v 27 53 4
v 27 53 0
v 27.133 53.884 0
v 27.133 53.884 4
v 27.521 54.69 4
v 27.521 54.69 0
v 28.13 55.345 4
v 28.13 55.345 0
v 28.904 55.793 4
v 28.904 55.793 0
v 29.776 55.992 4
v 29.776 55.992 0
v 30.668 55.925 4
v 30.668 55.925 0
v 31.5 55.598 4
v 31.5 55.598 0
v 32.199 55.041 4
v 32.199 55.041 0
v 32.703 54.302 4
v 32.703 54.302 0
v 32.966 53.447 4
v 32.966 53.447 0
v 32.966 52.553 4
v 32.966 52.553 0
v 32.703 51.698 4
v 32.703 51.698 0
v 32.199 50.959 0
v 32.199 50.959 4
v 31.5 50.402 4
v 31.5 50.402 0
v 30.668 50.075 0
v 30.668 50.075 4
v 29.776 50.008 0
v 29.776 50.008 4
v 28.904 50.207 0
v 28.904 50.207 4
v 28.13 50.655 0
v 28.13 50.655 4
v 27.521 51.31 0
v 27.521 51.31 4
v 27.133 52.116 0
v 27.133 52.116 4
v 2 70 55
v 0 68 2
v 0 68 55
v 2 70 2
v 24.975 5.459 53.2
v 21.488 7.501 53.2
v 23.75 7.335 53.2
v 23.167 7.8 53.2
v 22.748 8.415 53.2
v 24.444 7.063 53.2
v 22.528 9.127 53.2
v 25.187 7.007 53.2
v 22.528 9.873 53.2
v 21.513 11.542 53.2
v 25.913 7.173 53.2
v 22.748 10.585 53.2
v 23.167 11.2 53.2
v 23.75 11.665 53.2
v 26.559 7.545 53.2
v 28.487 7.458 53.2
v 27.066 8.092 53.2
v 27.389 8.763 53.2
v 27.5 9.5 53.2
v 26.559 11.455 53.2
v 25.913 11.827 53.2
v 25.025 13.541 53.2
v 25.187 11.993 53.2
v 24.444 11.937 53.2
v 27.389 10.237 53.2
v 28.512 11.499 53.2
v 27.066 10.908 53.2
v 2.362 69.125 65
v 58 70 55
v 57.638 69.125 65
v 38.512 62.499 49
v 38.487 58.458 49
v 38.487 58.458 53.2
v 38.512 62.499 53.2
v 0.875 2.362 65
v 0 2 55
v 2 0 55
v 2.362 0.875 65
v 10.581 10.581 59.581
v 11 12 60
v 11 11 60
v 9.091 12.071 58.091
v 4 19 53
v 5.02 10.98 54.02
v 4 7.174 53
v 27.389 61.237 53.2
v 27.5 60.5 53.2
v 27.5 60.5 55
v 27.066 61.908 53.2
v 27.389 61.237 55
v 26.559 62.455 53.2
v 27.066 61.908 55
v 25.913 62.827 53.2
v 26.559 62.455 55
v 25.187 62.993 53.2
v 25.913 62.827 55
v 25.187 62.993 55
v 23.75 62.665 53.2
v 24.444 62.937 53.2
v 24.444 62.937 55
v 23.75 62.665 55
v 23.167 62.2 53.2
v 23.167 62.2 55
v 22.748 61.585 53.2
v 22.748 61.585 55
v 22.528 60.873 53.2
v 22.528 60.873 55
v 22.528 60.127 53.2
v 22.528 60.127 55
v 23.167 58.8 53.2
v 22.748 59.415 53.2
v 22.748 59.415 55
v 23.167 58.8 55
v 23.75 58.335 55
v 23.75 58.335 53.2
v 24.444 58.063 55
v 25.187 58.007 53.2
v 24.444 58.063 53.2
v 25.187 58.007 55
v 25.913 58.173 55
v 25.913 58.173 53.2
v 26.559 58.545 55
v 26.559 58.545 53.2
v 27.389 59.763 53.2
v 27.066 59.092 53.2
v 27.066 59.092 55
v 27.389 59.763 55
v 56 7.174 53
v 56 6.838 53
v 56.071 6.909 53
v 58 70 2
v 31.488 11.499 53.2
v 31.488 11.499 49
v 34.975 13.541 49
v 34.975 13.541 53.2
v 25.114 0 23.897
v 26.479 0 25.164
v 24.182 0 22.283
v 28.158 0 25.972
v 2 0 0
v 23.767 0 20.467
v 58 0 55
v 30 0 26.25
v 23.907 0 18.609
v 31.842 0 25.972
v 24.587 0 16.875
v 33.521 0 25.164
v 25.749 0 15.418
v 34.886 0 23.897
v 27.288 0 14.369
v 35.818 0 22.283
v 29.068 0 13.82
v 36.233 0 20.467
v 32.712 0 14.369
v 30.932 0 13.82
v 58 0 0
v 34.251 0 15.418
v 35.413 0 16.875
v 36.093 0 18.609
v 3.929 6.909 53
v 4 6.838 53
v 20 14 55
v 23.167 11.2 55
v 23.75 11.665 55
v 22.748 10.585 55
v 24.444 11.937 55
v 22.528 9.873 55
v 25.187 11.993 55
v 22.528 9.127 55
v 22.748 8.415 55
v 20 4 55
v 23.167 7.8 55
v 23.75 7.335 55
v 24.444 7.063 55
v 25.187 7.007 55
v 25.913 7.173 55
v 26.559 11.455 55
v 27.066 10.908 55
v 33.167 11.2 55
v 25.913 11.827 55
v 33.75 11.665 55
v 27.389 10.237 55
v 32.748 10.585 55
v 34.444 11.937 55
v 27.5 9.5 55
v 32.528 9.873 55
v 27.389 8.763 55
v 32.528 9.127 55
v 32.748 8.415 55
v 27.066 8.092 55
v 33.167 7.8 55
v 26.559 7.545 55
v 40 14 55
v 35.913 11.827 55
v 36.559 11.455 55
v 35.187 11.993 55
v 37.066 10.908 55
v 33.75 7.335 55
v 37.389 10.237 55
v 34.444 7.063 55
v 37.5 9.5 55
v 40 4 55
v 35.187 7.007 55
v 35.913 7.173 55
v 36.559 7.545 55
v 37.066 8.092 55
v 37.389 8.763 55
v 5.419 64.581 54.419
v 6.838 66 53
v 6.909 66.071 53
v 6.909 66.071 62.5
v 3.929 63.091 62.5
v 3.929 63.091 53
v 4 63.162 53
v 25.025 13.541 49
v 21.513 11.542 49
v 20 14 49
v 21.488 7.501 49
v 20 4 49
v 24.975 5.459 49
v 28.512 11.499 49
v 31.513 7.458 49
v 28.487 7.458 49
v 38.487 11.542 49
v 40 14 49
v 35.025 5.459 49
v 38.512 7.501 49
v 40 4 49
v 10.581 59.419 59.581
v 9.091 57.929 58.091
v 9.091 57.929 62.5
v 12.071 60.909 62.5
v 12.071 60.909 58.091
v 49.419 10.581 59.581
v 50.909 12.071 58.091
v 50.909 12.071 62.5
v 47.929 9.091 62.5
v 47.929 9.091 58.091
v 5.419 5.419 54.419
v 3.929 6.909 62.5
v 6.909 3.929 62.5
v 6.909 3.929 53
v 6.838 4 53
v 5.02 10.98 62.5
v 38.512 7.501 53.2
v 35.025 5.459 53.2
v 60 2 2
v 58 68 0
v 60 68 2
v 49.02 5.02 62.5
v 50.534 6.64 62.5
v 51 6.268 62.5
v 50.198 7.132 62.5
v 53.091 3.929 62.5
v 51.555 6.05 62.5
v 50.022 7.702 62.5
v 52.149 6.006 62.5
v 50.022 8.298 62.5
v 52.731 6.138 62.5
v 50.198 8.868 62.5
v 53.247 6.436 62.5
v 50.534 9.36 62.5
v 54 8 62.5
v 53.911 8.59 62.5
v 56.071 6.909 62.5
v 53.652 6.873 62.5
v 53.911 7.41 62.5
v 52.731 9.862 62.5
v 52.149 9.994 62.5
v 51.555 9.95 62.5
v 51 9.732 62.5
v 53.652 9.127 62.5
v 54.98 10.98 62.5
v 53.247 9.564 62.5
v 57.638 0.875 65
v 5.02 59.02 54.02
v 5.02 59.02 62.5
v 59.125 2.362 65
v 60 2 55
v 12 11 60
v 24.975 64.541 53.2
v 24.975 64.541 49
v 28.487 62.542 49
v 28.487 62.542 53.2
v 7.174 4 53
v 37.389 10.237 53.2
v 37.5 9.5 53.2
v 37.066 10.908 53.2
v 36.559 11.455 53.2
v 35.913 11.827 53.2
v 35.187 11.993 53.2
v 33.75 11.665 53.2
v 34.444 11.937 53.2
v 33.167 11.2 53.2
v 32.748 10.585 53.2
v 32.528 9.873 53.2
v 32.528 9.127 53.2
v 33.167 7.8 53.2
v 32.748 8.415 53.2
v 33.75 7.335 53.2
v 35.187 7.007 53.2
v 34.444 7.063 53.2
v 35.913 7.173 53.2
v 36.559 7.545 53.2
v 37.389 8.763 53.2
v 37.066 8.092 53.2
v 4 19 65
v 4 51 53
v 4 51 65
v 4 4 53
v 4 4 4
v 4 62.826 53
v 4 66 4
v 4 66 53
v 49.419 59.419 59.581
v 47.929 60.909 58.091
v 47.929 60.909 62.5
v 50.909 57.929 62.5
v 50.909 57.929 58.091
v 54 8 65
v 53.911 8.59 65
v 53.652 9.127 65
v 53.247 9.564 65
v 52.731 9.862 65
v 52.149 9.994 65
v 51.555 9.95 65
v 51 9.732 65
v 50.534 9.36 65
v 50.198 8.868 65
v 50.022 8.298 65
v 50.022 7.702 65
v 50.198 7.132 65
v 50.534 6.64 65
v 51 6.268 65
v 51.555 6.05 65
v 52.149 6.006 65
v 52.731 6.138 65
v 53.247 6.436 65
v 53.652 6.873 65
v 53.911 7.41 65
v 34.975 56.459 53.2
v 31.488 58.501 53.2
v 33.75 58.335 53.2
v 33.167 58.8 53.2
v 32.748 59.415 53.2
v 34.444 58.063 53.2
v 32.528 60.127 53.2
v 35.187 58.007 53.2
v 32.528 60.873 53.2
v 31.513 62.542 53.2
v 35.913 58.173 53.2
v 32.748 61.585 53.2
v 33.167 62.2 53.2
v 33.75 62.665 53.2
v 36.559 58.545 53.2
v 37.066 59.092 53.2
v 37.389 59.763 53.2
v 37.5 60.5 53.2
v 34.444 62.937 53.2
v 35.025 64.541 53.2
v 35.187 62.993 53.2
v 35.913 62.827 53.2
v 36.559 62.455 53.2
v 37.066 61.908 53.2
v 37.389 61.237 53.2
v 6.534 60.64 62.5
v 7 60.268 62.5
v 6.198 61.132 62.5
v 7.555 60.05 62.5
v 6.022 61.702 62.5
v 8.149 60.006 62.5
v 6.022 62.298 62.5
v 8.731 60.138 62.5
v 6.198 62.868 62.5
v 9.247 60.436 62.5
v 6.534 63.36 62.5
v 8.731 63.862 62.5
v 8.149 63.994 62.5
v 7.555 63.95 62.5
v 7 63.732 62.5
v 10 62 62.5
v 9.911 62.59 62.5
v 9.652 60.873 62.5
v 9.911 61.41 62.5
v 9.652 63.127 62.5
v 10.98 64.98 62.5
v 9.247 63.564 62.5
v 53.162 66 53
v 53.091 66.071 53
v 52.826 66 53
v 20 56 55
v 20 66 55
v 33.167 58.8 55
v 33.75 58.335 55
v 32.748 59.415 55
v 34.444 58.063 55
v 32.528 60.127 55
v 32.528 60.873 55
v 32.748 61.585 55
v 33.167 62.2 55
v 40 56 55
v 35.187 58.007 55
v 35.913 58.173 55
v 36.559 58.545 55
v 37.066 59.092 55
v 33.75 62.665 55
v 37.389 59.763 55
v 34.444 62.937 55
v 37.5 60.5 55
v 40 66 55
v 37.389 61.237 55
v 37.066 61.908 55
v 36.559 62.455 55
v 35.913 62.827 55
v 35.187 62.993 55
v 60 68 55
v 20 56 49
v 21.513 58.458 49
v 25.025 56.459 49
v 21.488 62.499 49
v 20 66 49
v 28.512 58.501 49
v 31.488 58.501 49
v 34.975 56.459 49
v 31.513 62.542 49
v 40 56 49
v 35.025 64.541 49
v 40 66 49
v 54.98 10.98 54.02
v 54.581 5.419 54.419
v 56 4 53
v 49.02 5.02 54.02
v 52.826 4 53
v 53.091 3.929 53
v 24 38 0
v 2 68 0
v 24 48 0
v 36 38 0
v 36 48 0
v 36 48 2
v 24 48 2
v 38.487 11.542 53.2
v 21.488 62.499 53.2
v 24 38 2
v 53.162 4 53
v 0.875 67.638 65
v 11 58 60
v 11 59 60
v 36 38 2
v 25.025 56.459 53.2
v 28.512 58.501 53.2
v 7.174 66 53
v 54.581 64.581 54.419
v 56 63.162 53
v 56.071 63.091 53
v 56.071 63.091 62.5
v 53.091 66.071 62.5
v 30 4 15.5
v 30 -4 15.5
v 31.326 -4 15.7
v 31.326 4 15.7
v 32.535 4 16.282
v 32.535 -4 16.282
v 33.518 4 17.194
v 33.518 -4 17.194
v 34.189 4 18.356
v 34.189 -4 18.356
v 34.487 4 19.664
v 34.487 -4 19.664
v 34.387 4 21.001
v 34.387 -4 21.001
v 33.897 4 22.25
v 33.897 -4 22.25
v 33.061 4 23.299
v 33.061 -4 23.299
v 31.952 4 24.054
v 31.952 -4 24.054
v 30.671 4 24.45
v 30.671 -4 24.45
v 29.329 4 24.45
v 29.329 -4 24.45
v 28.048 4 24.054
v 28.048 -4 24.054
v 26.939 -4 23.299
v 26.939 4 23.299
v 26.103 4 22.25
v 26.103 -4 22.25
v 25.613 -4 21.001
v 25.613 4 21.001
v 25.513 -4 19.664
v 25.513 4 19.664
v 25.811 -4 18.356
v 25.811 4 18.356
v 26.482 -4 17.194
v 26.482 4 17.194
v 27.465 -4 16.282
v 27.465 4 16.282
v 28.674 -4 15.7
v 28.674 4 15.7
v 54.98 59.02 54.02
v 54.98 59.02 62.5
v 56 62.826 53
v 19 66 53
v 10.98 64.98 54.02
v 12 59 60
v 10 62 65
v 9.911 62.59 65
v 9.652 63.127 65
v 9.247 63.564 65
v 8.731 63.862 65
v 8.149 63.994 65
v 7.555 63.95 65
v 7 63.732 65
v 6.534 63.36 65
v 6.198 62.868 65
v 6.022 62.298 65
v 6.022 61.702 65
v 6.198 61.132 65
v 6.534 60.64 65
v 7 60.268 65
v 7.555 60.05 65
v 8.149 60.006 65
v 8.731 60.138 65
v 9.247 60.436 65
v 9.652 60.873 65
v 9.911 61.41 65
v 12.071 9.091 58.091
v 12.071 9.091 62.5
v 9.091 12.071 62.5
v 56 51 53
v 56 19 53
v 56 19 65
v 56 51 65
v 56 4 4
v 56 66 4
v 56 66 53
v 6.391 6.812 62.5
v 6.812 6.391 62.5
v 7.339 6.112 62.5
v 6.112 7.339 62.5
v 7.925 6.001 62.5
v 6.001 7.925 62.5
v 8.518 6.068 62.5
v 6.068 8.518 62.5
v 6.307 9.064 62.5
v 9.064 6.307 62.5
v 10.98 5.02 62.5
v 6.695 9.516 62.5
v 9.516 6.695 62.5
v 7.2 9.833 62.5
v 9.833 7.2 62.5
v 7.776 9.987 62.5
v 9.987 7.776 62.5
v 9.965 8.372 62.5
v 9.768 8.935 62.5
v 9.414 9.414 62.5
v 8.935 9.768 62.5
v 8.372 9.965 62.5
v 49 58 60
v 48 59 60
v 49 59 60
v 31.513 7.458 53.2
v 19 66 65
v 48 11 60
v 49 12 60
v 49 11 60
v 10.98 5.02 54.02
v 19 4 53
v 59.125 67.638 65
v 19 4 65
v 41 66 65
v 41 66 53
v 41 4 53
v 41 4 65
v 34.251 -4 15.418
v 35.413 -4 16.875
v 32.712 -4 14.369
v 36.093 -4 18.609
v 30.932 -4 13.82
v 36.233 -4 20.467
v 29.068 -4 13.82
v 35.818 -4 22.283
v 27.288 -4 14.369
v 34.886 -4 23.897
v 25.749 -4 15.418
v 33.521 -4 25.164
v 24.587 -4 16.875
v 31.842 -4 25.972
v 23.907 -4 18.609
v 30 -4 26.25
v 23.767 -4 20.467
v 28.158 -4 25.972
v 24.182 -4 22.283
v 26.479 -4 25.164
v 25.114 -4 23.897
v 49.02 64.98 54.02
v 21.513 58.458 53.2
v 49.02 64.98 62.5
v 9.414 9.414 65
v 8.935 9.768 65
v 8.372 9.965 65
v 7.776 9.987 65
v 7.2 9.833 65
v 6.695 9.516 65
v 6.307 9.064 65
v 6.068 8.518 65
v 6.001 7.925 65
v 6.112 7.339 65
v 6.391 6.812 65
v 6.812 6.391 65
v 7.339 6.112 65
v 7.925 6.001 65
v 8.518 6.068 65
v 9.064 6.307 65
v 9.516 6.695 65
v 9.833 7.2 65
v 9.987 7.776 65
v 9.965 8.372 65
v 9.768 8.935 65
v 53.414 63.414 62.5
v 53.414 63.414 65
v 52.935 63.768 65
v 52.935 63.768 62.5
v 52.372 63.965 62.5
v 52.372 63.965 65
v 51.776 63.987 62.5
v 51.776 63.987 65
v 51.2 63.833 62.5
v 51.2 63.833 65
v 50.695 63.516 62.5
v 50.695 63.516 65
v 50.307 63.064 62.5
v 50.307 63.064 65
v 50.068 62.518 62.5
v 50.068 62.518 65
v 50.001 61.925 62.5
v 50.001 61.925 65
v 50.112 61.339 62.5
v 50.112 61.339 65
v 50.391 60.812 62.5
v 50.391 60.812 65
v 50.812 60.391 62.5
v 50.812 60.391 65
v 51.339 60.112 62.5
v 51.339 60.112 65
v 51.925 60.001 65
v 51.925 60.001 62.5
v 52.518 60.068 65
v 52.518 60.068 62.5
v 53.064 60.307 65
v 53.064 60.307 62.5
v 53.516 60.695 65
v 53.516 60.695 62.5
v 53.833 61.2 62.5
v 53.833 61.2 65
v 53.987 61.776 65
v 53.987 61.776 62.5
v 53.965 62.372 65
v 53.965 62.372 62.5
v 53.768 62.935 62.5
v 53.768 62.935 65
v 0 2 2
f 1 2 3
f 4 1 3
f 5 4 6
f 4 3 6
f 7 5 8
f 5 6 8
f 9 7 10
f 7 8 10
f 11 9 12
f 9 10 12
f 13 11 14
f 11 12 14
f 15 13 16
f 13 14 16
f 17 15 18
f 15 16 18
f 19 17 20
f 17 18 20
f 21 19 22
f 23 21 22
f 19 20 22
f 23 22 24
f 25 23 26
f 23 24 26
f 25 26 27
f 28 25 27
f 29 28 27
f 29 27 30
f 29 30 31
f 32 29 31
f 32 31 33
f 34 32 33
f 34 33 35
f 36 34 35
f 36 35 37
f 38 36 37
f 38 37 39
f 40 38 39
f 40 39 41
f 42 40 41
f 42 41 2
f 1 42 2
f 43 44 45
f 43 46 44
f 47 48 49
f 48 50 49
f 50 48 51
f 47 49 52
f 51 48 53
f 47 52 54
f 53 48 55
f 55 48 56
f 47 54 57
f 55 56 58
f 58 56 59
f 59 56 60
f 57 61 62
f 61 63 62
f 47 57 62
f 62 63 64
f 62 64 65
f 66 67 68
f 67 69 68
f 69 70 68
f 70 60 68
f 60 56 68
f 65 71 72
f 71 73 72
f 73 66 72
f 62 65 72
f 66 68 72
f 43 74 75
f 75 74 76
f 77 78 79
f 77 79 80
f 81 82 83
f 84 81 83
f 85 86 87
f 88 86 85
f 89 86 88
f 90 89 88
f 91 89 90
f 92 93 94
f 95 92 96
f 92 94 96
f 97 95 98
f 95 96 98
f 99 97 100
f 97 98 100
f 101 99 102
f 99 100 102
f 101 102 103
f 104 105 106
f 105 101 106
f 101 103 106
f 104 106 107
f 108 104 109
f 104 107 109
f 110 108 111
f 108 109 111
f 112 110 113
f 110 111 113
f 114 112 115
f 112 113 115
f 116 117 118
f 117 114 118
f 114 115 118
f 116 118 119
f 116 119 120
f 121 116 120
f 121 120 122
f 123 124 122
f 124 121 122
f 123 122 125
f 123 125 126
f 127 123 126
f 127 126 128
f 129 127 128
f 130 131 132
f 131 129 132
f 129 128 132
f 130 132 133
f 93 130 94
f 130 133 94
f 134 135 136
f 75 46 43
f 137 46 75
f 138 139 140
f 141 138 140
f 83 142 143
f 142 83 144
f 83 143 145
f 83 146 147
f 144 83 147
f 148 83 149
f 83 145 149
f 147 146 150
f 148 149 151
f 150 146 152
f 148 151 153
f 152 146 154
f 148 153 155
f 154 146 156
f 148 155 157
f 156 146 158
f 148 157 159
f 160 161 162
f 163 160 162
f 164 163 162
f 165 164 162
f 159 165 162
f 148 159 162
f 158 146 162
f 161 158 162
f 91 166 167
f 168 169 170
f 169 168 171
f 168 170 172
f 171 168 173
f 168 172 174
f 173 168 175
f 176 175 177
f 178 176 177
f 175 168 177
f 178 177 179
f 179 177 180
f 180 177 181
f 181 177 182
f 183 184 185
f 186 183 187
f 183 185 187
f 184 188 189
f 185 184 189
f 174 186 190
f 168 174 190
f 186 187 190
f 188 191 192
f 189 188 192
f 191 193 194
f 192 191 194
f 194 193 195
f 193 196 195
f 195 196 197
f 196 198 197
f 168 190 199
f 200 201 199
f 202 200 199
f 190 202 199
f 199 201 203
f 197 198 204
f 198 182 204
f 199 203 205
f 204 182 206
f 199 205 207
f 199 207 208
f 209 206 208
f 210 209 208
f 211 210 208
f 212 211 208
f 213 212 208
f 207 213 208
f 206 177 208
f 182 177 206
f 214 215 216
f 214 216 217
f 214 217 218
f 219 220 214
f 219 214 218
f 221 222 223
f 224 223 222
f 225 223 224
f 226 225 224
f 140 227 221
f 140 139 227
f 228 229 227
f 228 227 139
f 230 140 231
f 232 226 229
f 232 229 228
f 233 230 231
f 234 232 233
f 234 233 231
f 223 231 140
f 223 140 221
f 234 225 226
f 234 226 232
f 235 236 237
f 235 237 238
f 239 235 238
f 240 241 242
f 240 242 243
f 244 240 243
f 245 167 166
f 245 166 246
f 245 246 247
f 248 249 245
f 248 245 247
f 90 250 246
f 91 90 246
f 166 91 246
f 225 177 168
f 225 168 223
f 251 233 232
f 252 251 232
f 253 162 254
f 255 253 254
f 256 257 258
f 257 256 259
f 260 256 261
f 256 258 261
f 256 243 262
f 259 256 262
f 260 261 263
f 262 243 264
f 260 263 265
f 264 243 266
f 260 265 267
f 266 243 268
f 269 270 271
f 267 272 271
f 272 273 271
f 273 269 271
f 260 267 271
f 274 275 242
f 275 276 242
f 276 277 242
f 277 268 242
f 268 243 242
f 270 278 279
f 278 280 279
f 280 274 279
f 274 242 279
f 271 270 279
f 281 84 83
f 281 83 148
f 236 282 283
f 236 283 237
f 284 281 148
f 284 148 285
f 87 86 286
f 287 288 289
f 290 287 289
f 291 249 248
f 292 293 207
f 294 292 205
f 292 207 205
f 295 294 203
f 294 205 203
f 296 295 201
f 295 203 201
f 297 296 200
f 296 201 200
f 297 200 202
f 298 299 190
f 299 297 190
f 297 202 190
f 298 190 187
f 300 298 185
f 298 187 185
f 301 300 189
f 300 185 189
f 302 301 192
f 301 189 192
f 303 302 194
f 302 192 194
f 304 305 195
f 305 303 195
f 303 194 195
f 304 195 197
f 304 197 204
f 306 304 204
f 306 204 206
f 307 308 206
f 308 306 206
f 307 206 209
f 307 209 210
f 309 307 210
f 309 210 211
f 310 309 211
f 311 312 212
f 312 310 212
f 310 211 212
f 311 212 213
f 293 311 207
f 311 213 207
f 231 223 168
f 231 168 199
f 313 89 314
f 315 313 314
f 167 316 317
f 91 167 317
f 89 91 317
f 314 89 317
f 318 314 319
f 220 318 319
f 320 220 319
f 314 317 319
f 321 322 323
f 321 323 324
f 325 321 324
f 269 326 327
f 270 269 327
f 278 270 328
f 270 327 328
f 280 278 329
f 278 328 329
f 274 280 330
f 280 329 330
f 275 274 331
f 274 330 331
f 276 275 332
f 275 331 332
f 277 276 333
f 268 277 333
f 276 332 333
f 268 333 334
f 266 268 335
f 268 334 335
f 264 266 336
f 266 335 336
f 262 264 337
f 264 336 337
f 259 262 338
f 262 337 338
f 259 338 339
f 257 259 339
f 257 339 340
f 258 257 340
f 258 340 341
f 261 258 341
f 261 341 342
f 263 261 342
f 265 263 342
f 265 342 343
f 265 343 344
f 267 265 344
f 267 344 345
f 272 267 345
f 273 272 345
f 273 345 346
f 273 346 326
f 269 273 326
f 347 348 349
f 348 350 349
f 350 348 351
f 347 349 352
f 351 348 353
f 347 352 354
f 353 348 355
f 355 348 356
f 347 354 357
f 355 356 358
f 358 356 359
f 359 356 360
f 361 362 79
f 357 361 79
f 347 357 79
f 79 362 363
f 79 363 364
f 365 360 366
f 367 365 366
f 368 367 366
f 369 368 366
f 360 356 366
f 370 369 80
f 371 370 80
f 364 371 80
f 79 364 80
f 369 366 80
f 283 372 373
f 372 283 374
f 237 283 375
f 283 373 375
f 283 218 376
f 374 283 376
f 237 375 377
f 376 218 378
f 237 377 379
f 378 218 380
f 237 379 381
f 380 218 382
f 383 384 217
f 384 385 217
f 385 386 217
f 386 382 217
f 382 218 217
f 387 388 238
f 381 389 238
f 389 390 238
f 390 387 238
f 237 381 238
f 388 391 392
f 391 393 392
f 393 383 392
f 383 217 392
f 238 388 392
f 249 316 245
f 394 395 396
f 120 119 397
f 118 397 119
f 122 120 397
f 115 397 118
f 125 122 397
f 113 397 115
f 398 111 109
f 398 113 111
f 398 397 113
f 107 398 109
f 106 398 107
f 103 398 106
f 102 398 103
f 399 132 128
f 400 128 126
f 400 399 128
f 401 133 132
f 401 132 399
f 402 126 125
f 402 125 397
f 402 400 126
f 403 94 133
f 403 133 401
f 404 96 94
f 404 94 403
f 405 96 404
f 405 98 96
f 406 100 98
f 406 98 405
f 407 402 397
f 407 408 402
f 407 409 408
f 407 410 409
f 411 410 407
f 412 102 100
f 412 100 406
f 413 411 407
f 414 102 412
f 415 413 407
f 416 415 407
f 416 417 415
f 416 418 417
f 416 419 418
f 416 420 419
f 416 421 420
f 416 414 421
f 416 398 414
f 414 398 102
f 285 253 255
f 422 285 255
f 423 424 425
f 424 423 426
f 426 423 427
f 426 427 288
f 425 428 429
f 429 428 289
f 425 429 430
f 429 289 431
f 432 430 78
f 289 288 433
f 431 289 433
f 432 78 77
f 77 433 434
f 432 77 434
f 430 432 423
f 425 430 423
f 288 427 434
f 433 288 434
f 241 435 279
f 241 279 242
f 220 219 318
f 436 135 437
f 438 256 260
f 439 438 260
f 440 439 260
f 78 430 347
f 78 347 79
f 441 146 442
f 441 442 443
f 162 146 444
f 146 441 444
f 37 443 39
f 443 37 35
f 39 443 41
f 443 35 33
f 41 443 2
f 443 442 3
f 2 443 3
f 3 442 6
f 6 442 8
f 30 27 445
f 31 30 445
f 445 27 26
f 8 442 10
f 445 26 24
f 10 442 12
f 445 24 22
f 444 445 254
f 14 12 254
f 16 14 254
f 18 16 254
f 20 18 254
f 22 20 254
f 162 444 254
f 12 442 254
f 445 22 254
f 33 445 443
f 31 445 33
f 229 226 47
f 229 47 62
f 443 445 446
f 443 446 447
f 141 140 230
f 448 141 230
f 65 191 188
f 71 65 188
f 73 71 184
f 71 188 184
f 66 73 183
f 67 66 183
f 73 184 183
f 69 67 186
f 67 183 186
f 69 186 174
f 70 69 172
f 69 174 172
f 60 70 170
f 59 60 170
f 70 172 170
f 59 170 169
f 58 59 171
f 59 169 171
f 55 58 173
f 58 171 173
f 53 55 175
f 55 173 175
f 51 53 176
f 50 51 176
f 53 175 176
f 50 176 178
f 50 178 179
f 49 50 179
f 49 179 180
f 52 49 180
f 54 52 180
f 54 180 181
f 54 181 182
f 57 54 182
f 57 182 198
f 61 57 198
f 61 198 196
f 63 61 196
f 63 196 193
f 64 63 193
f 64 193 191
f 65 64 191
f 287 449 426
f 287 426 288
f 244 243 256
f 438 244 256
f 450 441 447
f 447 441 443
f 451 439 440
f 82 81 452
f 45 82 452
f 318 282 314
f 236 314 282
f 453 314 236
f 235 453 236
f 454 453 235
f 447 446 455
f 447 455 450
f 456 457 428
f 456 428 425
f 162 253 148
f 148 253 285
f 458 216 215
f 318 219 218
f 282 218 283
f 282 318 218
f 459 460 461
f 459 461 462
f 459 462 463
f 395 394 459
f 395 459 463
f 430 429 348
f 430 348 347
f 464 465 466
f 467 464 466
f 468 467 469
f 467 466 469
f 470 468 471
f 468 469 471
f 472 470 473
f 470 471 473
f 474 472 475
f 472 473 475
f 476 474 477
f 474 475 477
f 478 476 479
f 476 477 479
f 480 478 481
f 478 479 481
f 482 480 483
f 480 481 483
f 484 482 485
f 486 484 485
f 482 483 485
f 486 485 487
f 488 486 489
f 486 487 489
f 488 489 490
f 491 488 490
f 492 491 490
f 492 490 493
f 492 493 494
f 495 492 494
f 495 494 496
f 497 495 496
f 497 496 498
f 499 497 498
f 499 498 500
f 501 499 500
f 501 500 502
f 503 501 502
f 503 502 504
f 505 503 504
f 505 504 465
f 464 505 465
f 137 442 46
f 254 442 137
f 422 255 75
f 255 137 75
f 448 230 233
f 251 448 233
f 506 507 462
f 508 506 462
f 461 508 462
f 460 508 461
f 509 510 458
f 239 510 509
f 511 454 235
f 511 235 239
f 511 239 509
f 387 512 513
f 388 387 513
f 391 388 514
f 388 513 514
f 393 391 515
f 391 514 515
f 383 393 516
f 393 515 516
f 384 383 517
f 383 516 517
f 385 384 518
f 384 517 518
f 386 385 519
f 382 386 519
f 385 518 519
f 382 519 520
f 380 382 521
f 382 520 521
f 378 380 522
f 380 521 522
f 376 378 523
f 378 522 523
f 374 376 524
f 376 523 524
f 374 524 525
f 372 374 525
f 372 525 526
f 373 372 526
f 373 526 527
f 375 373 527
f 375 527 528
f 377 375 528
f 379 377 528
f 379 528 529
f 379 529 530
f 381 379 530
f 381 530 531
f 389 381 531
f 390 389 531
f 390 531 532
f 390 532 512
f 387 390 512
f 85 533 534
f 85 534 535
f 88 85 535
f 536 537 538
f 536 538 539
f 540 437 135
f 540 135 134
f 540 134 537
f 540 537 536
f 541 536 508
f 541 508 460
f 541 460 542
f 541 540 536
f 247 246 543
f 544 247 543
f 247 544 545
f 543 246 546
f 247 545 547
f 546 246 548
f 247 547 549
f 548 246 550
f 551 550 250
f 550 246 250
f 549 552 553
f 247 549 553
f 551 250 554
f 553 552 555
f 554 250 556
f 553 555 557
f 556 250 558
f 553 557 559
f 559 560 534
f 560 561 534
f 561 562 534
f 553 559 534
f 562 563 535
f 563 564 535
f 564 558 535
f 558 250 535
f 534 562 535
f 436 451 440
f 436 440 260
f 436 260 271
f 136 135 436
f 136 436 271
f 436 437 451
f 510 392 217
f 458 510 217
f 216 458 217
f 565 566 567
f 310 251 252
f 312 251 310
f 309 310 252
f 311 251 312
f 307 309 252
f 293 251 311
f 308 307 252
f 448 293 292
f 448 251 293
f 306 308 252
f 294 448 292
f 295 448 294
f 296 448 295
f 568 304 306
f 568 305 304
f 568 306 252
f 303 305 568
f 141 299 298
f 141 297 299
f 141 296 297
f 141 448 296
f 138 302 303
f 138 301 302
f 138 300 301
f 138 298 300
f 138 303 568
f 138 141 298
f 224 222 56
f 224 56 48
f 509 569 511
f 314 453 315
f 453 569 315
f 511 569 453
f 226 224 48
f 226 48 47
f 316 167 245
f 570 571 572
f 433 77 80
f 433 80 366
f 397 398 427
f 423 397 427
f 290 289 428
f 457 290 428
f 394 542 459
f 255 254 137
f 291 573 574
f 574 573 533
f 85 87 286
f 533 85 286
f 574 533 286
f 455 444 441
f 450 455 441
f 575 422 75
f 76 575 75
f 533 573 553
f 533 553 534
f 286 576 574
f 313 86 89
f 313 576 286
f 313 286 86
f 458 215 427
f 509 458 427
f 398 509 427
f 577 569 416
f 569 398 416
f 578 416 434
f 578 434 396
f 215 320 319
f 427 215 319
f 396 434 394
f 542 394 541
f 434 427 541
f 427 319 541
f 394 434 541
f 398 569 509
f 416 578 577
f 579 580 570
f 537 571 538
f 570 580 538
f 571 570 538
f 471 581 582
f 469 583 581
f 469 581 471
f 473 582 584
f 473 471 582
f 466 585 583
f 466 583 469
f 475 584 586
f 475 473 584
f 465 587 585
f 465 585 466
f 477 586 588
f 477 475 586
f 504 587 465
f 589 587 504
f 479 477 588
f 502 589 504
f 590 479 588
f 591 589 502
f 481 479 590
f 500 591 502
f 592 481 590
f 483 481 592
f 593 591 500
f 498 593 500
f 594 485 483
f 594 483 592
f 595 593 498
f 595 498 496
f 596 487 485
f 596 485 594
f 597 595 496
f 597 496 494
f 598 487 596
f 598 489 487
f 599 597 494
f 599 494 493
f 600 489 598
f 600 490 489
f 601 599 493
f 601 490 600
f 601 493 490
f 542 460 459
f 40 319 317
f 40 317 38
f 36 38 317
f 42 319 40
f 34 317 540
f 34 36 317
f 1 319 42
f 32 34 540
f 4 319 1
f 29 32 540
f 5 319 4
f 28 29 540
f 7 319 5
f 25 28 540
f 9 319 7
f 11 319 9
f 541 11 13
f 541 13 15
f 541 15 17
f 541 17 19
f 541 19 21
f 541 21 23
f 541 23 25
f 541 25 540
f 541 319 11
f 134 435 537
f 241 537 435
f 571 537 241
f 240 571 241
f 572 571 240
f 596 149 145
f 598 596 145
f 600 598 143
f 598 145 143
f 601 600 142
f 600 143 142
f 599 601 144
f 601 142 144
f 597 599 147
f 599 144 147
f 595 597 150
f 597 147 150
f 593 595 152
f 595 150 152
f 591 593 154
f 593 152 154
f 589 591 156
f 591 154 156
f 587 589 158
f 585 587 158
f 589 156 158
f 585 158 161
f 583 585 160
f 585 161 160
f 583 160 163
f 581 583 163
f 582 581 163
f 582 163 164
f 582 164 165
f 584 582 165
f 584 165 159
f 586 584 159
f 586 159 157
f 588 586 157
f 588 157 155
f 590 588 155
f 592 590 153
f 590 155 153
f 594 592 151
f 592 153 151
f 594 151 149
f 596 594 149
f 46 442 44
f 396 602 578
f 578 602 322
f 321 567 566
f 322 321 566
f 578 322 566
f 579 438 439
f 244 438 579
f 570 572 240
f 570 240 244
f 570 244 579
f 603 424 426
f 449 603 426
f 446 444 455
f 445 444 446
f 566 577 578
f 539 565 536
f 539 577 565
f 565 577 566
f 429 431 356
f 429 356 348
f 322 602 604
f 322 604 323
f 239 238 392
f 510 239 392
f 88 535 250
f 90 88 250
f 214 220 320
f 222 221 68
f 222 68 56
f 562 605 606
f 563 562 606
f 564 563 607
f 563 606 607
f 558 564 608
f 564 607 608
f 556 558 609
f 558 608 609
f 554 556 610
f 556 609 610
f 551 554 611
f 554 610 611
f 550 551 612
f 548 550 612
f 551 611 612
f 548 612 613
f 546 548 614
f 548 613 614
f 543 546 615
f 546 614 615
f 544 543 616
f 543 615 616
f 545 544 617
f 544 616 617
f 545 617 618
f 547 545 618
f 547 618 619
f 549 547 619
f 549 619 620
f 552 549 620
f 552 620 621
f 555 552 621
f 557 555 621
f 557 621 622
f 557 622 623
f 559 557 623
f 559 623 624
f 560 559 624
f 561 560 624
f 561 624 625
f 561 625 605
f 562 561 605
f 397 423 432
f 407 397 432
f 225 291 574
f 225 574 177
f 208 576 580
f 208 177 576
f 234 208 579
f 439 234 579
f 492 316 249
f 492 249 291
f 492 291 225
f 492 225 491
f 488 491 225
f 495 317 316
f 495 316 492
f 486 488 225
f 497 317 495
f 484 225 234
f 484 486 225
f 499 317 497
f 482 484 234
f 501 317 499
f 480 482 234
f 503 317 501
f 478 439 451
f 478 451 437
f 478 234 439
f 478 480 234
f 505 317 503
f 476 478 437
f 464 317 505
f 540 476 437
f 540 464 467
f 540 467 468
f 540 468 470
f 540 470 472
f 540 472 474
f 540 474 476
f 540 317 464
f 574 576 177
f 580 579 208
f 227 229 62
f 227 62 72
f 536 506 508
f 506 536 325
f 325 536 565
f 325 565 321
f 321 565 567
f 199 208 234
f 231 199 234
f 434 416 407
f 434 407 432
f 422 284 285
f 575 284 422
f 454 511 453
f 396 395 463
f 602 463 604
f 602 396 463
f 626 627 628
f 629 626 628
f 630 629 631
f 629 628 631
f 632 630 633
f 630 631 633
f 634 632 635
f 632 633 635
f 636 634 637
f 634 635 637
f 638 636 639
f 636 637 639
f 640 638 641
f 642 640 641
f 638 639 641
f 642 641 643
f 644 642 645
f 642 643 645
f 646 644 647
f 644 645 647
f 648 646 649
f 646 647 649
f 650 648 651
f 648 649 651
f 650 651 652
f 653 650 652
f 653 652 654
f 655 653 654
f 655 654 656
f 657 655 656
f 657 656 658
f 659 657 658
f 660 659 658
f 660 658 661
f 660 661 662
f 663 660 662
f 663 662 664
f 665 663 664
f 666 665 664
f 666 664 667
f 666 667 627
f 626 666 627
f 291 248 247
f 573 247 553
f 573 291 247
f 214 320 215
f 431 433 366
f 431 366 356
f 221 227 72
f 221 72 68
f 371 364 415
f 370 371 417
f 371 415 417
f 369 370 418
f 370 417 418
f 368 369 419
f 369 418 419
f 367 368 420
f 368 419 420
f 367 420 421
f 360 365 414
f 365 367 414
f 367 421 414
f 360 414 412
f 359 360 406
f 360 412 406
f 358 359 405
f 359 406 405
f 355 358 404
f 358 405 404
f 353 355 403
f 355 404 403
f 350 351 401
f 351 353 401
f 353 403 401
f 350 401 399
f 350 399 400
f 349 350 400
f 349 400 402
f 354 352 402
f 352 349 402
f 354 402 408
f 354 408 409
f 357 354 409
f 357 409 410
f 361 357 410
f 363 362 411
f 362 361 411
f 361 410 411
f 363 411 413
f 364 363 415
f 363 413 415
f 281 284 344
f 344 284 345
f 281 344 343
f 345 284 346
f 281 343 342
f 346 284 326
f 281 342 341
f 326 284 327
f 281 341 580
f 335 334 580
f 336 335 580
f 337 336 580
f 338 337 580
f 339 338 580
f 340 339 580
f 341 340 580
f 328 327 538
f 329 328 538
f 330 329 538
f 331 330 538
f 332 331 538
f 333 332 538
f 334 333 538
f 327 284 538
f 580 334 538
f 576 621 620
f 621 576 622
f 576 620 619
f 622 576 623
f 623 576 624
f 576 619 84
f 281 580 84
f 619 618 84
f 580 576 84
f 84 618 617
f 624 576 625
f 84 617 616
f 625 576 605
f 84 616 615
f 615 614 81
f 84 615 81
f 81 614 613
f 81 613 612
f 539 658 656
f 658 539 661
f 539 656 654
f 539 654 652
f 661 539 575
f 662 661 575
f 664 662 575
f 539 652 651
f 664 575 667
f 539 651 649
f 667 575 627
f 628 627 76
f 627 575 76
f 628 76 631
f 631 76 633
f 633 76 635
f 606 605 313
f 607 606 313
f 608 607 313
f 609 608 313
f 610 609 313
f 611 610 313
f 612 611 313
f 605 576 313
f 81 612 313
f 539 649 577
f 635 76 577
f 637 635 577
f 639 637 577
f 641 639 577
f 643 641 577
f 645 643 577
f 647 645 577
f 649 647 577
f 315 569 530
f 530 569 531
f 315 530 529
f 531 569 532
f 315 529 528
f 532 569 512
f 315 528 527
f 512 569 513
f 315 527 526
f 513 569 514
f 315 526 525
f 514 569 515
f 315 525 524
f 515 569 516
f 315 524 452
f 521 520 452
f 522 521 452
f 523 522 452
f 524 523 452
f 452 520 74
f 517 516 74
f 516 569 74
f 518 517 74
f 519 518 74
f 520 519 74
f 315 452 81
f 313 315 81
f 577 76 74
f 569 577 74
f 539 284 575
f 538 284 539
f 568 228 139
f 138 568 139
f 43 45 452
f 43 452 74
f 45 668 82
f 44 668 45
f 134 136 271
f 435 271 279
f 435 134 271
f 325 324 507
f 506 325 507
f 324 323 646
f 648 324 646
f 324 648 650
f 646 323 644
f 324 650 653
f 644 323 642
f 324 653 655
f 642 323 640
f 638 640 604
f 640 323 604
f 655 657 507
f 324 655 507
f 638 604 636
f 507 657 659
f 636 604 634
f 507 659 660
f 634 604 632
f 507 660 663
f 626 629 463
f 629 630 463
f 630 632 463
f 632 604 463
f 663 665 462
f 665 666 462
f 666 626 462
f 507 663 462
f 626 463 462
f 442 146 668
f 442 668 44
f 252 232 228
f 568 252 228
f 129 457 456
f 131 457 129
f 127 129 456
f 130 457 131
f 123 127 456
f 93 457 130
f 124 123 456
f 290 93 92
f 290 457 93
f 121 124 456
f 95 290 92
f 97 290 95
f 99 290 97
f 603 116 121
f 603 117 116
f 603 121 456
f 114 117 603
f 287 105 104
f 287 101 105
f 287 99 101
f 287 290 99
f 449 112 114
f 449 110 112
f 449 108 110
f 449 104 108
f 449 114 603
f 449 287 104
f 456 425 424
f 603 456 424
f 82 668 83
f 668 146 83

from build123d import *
from OCP.BRepFilletAPI import BRepFilletAPI_MakeChamfer

# Parameters (mm, degrees)
SKIZZE1_W                          = 60
SKIZZE1_H                          = 70
GRUNDK_RPER_DEPTH                  = 65
FASE2_SIZE                         = 2
WANDUNG1_T                         = -4
SKIZZE2_W                          = 20
SKIZZE2_H                          = 6
AUFSATZ_LINEAR_AUSTRAGEN1_DEPTH    = 10
BOHRUNGEN_SERVO_REACH              = 109.355
SKIZZE3_R                          = 2.5
SECHSKANT_START                    = -4.2
SKIZZE5_R                          = 2.5
SKIZZE5_R_2                        = 2
SECHSKANT_DEPTH                    = 4.2
AUSPARUNGEN_DEPTH                  = 5
FASE3_SIZE                         = 7
BOHRUNGENHALTERUNG_REACH           = 114.805
SKIZZE8_R                          = 2
SECHSKANT_START_2                  = -9.5
SECHSKANT_DECKEL_DEPTH             = 9.5
BOHRUNG_VERSCHRAUBUNG_DECKEL_REACH = 114.805
SKIZZE11_R                         = 3
SKIZZE14_R                         = 0.883929471
SKIZZE14_W                         = 12
SKIZZE14_H                         = 10
VERTIEFUNG_DECKEL_DEPTH            = 2
SKIZZE16_R                         = 6.25
AUFSATZ_KABELBOHRUNGEN_DEPTH       = 4
BOHRUNGSDURCHMESSER_KABEL_REACH    = 117.33
SKIZZE17_R                         = 4.5
FASE4_SIZE                         = 10
FASE4_SIZE2                        = 0.874886635


with BuildPart() as part:
    # Skizze1 → Grundkörper (new body)
    with BuildSketch(Plane.XY):
        with Locations((30, 35)):
            Rectangle(SKIZZE1_W, SKIZZE1_H)
    extrude(amount=GRUNDK_RPER_DEPTH)

    # Fase2
    fase2_edges = [part.edges().sort_by_distance(p)[0] for p in [
        (30, 70, 0),
        (60, 35, 0),
        (0, 35, 0),
        (0, 70, 32.5),
        (60, 70, 32.5),
        (60, 0, 32.5),
        (0, 0, 32.5),
    ]]
    chamfer(fase2_edges, length=FASE2_SIZE)

    # Wandung1
    wandung1_openings = [part.faces().sort_by_distance(p)[0] for p in [
        (30, 35, 65),
    ]]
    offset(amount=WANDUNG1_T, openings=wandung1_openings)

    # Skizze2 → Aufsatz-Linear austragen1 (add)
    with BuildSketch(Plane(origin=(0, 4, 0), x_dir=(1, 0, 0), z_dir=(0, 1, 0))):
        with Locations((30, -52)):
            Rectangle(SKIZZE2_W, SKIZZE2_H)
    aufsatz_linear_austragen1 = extrude(amount=AUFSATZ_LINEAR_AUSTRAGEN1_DEPTH)

    # Spiegeln1: Aufsatz-Linear austragen1 across plane
    add(aufsatz_linear_austragen1.mirror(Plane(origin=(0, 35, 0), x_dir=(0, 0, 1), z_dir=(0, -1, 0))))

    # Skizze3 → Bohrungen Servo (cut, up to next)
    with BuildSketch(Plane.XY.offset(55), mode=Mode.PRIVATE) as bohrungen_servo_sk1:
        with Locations((25, 9.5)):
            Circle(SKIZZE3_R)
    bohrungen_servo_tool1 = extrude(bohrungen_servo_sk1.sketch, amount=-BOHRUNGEN_SERVO_REACH, mode=Mode.PRIVATE) & part.part
    # Skizze3 → Bohrungen Servo (cut, up to next)
    with BuildSketch(Plane.XY.offset(55), mode=Mode.PRIVATE) as bohrungen_servo_sk2:
        with Locations((35, 9.5)):
            Circle(SKIZZE3_R)
    bohrungen_servo_tool2 = extrude(bohrungen_servo_sk2.sketch, amount=-BOHRUNGEN_SERVO_REACH, mode=Mode.PRIVATE) & part.part
    # Skizze3 → Bohrungen Servo (cut, up to next)
    with BuildSketch(Plane.XY.offset(55), mode=Mode.PRIVATE) as bohrungen_servo_sk3:
        with Locations((35, 60.5)):
            Circle(SKIZZE3_R)
    bohrungen_servo_tool3 = extrude(bohrungen_servo_sk3.sketch, amount=-BOHRUNGEN_SERVO_REACH, mode=Mode.PRIVATE) & part.part
    # Skizze3 → Bohrungen Servo (cut, up to next)
    with BuildSketch(Plane.XY.offset(55), mode=Mode.PRIVATE) as bohrungen_servo_sk4:
        with Locations((25, 60.5)):
            Circle(SKIZZE3_R)
    bohrungen_servo_tool4 = extrude(bohrungen_servo_sk4.sketch, amount=-BOHRUNGEN_SERVO_REACH, mode=Mode.PRIVATE) & part.part
    add(bohrungen_servo_tool1.solids().sort_by_distance((25, 9.5, 55))[0], mode=Mode.SUBTRACT)
    add(bohrungen_servo_tool2.solids().sort_by_distance((35, 9.5, 55))[0], mode=Mode.SUBTRACT)
    add(bohrungen_servo_tool3.solids().sort_by_distance((35, 60.5, 55))[0], mode=Mode.SUBTRACT)
    add(bohrungen_servo_tool4.solids().sort_by_distance((25, 60.5, 55))[0], mode=Mode.SUBTRACT)

    # Skizze5 → Sechskant (cut)
    # profile 1 of 4: a face of its own
    with BuildSketch(Plane(origin=(0, 0, 49), x_dir=(-1, 0, 0), z_dir=(0, 0, -1)).offset(SECHSKANT_START)):
        Polygon((-34.97509641, 13.541375155), (-38.487481756, 11.542254719), (-38.512385346, 7.500879564), (-35.02490359, 5.458624845), (-31.512518244, 7.457745281), (-31.487614654, 11.499120436), align=None)
        with Locations(Location((-35, 9.5, 0), (0, 0, 180))):
            Circle(SKIZZE5_R, mode=Mode.SUBTRACT)
    # profile 2 of 4: a face of its own
    with BuildSketch(Plane(origin=(0, 0, 49), x_dir=(-1, 0, 0), z_dir=(0, 0, -1)).offset(SECHSKANT_START)):
        Polygon((-31.487614654, 58.500879564), (-34.97509641, 56.458624845), (-38.487481756, 58.457745281), (-38.512385346, 62.499120436), (-35.02490359, 64.541375155), (-31.512518244, 62.542254719), align=None)
        with Locations(Location((-35, 60.5, 0), (0, 0, 180))):
            Circle(SKIZZE5_R, mode=Mode.SUBTRACT)
    # profile 3 of 4: a face of its own
    with BuildSketch(Plane(origin=(0, 0, 49), x_dir=(-1, 0, 0), z_dir=(0, 0, -1)).offset(SECHSKANT_START)):
        Polygon((-28.487481756, 62.542254719), (-28.512385346, 58.500879564), (-25.02490359, 56.458624845), (-21.512518244, 58.457745281), (-21.487614654, 62.499120436), (-24.97509641, 64.541375155), align=None)
        with Locations(Location((-25, 60.5, 0), (0, 0, 180))):
            Circle(SKIZZE5_R, mode=Mode.SUBTRACT)
    # profile 4 of 4: a face of its own
    with BuildSketch(Plane(origin=(0, 0, 49), x_dir=(-1, 0, 0), z_dir=(0, 0, -1)).offset(SECHSKANT_START)):
        Polygon((-28.512385346, 11.499120436), (-25.02490359, 13.541375155), (-21.512518244, 11.542254719), (-21.487614654, 7.500879564), (-24.97509641, 5.458624845), (-28.487481756, 7.457745281), align=None)
        with Locations((-25, 9.5)):
            Circle(SKIZZE5_R_2, mode=Mode.SUBTRACT)
    extrude(amount=SECHSKANT_DEPTH, mode=Mode.SUBTRACT)

    # Skizze7 → Ausparungen (add)
    with BuildSketch(Plane.XY.offset(65)):
        Polygon((56, 4), (41, 4), (56, 19), align=None)
        Polygon((19, 4), (4, 19), (4, 4), align=None)
        Polygon((4, 66), (19, 66), (4, 51), align=None)
        Polygon((41, 66), (56, 51), (56, 66), align=None)
    extrude(amount=-AUSPARUNGEN_DEPTH)

    # Fase3
    fase3_edges = [part.edges().sort_by_distance(p)[0] for p in [
        (56, 11.5, 60),
        (48.5, 4, 60),
        (11.5, 4, 60),
        (4, 11.5, 60),
        (4, 58.5, 60),
        (11.5, 66, 60),
        (48.5, 66, 60),
        (56, 58.5, 60),
    ]]
    chamfer(fase3_edges, length=FASE3_SIZE)

    # Skizze8 → BohrungenHalterung (cut, up to next)
    with BuildSketch(Plane.XY.offset(65), mode=Mode.PRIVATE) as bohrungenhalterung_sk1:
        with Locations((52, 8)):
            Circle(SKIZZE8_R)
    bohrungenhalterung_tool1 = extrude(bohrungenhalterung_sk1.sketch, amount=-BOHRUNGENHALTERUNG_REACH, mode=Mode.PRIVATE) & part.part
    # Skizze8 → BohrungenHalterung (cut, up to next)
    with BuildSketch(Plane.XY.offset(65), mode=Mode.PRIVATE) as bohrungenhalterung_sk2:
        with Locations(Location((8, 8, 0), (0, 0, 45))):
            Circle(SKIZZE8_R)
    bohrungenhalterung_tool2 = extrude(bohrungenhalterung_sk2.sketch, amount=-BOHRUNGENHALTERUNG_REACH, mode=Mode.PRIVATE) & part.part
    # Skizze8 → BohrungenHalterung (cut, up to next)
    with BuildSketch(Plane.XY.offset(65), mode=Mode.PRIVATE) as bohrungenhalterung_sk3:
        with Locations((8, 62)):
            Circle(SKIZZE8_R)
    bohrungenhalterung_tool3 = extrude(bohrungenhalterung_sk3.sketch, amount=-BOHRUNGENHALTERUNG_REACH, mode=Mode.PRIVATE) & part.part
    # Skizze8 → BohrungenHalterung (cut, up to next)
    with BuildSketch(Plane.XY.offset(65), mode=Mode.PRIVATE) as bohrungenhalterung_sk4:
        with Locations(Location((52, 62, 0), (0, 0, 45))):
            Circle(SKIZZE8_R)
    bohrungenhalterung_tool4 = extrude(bohrungenhalterung_sk4.sketch, amount=-BOHRUNGENHALTERUNG_REACH, mode=Mode.PRIVATE) & part.part
    add(bohrungenhalterung_tool1.solids().sort_by_distance((52, 8, 65))[0], mode=Mode.SUBTRACT)
    add(bohrungenhalterung_tool2.solids().sort_by_distance((8, 8, 65))[0], mode=Mode.SUBTRACT)
    add(bohrungenhalterung_tool3.solids().sort_by_distance((8, 62, 65))[0], mode=Mode.SUBTRACT)
    add(bohrungenhalterung_tool4.solids().sort_by_distance((52, 62, 65))[0], mode=Mode.SUBTRACT)

    # Skizze13 → Sechskant Deckel (cut)
    with BuildSketch(Plane.XY.offset(62.5).offset(SECHSKANT_START_2)):
        Polygon((50.909166509, 57.928953988), (54.98021252, 59.01978748), (56.071046012, 63.090833491), (53.090833491, 66.071046012), (49.01978748, 64.98021252), (47.928953988, 60.909166509), align=None)
        Polygon((49.01978748, 5.01978748), (53.090833491, 3.928953988), (56.071046012, 6.909166509), (54.98021252, 10.98021252), (50.909166509, 12.071046012), (47.928953988, 9.090833491), align=None)
        Polygon((3.928953988, 6.909166509), (6.909166509, 3.928953988), (10.98021252, 5.01978748), (12.071046012, 9.090833491), (9.090833491, 12.071046012), (5.01978748, 10.98021252), align=None)
        Polygon((5.01978748, 59.01978748), (9.090833491, 57.928953988), (12.071046012, 60.909166509), (10.98021252, 64.98021252), (6.909166509, 66.071046012), (3.928953988, 63.090833491), align=None)
    extrude(amount=SECHSKANT_DECKEL_DEPTH, mode=Mode.SUBTRACT)

    # Skizze11 → Bohrung Verschraubung Deckel (cut, up to next)
    with BuildSketch(Plane(origin=(0, 0, 0), x_dir=(-1, 0, 0), z_dir=(0, 0, -1)), mode=Mode.PRIVATE) as bohrung_verschraubung_deckel_sk1:
        with Locations((-30, 53)):
            Circle(SKIZZE11_R)
    bohrung_verschraubung_deckel_tool1 = extrude(bohrung_verschraubung_deckel_sk1.sketch, amount=-BOHRUNG_VERSCHRAUBUNG_DECKEL_REACH, mode=Mode.PRIVATE) & part.part
    add(bohrung_verschraubung_deckel_tool1.solids().sort_by_distance((30, 53, 0))[0], mode=Mode.SUBTRACT)

    # Skizze14 → Vertiefung Deckel (cut)
    with BuildSketch(Plane(origin=(0, 0, 0), x_dir=(-1, 0, 0), z_dir=(0, 0, -1))):
        with Locations((-30, 53)):
            Circle(SKIZZE14_R)
        with Locations((-30, 43)):
            Rectangle(SKIZZE14_W, SKIZZE14_H)
    extrude(amount=-VERTIEFUNG_DECKEL_DEPTH, mode=Mode.SUBTRACT)

    # Skizze16 → Aufsatz Kabelbohrungen (add)
    with BuildSketch(Plane.XZ):
        with Locations(Location((30, 20, 0), (0, 0, 90))):
            Circle(SKIZZE16_R)
    extrude(amount=AUFSATZ_KABELBOHRUNGEN_DEPTH)

    # Skizze17 → Bohrungsdurchmesser Kabel (cut, up to next)
    with BuildSketch(Plane.XZ.offset(4), mode=Mode.PRIVATE) as bohrungsdurchmesser_kabel_sk1:
        with Locations(Location((30, 20, 0), (0, 0, 270))):
            Circle(SKIZZE17_R)
    bohrungsdurchmesser_kabel_tool1 = extrude(bohrungsdurchmesser_kabel_sk1.sketch, amount=-BOHRUNGSDURCHMESSER_KABEL_REACH, mode=Mode.PRIVATE) & part.part
    add(bohrungsdurchmesser_kabel_tool1.solids().sort_by_distance((30, -4, 20))[0], mode=Mode.SUBTRACT)

    # Fase4: one chamfer whose edges measure the first distance from different faces: ONE call of the kernel's chamfer builder (chamfer() names one face for all edges)
    fase4_edges_1 = [part.edges().sort_by_distance(p)[0] for p in [
        (30, 0, 65),
    ]]
    fase4_side_1 = [part.faces().sort_by_distance(p)[0] for p in [
        (30, 0, 32.936126813),
    ]]
    fase4_edges_2 = [part.edges().sort_by_distance(p)[0] for p in [
        (0, 35, 65),
    ]]
    fase4_side_2 = [part.faces().sort_by_distance(p)[0] for p in [
        (0, 35, 33.5),
    ]]
    fase4_edges_3 = [part.edges().sort_by_distance(p)[0] for p in [
        (60, 35, 65),
    ]]
    fase4_side_3 = [part.faces().sort_by_distance(p)[0] for p in [
        (60, 35, 33.5),
    ]]
    fase4_edges_4 = [part.edges().sort_by_distance(p)[0] for p in [
        (30, 70, 65),
    ]]
    fase4_side_4 = [part.faces().sort_by_distance(p)[0] for p in [
        (30, 70, 33.5),
    ]]
    fase4_edges_5 = [part.edges().sort_by_distance(p)[0] for p in [
        (1, 69, 65),
    ]]
    fase4_side_5 = [part.faces().sort_by_distance(p)[0] for p in [
        (1, 69, 33.5),
    ]]
    fase4_edges_6 = [part.edges().sort_by_distance(p)[0] for p in [
        (59, 69, 65),
    ]]
    fase4_side_6 = [part.faces().sort_by_distance(p)[0] for p in [
        (59, 69, 33.5),
    ]]
    fase4_edges_7 = [part.edges().sort_by_distance(p)[0] for p in [
        (59, 1, 65),
    ]]
    fase4_side_7 = [part.faces().sort_by_distance(p)[0] for p in [
        (58.994791667, 0.994791667, 32.997395833),
    ]]
    fase4_edges_8 = [part.edges().sort_by_distance(p)[0] for p in [
        (1, 1, 65),
    ]]
    fase4_side_8 = [part.faces().sort_by_distance(p)[0] for p in [
        (1.005208333, 0.994791667, 32.997395833),
    ]]
    fase4 = BRepFilletAPI_MakeChamfer(part.part.solid().wrapped)
    for e in fase4_edges_1:
        fase4.Add(FASE4_SIZE, FASE4_SIZE2, e.wrapped, fase4_side_1[0].wrapped)  # the first distance lies on this face
    for e in fase4_edges_2:
        fase4.Add(FASE4_SIZE, FASE4_SIZE2, e.wrapped, fase4_side_2[0].wrapped)  # the first distance lies on this face
    for e in fase4_edges_3:
        fase4.Add(FASE4_SIZE, FASE4_SIZE2, e.wrapped, fase4_side_3[0].wrapped)  # the first distance lies on this face
    for e in fase4_edges_4:
        fase4.Add(FASE4_SIZE, FASE4_SIZE2, e.wrapped, fase4_side_4[0].wrapped)  # the first distance lies on this face
    for e in fase4_edges_5:
        fase4.Add(FASE4_SIZE, FASE4_SIZE2, e.wrapped, fase4_side_5[0].wrapped)  # the first distance lies on this face
    for e in fase4_edges_6:
        fase4.Add(FASE4_SIZE, FASE4_SIZE2, e.wrapped, fase4_side_6[0].wrapped)  # the first distance lies on this face
    for e in fase4_edges_7:
        fase4.Add(FASE4_SIZE, FASE4_SIZE2, e.wrapped, fase4_side_7[0].wrapped)  # the first distance lies on this face
    for e in fase4_edges_8:
        fase4.Add(FASE4_SIZE, FASE4_SIZE2, e.wrapped, fase4_side_8[0].wrapped)  # the first distance lies on this face
    add(Compound.cast(fase4.Shape()), mode=Mode.REPLACE)


solid = part.part
